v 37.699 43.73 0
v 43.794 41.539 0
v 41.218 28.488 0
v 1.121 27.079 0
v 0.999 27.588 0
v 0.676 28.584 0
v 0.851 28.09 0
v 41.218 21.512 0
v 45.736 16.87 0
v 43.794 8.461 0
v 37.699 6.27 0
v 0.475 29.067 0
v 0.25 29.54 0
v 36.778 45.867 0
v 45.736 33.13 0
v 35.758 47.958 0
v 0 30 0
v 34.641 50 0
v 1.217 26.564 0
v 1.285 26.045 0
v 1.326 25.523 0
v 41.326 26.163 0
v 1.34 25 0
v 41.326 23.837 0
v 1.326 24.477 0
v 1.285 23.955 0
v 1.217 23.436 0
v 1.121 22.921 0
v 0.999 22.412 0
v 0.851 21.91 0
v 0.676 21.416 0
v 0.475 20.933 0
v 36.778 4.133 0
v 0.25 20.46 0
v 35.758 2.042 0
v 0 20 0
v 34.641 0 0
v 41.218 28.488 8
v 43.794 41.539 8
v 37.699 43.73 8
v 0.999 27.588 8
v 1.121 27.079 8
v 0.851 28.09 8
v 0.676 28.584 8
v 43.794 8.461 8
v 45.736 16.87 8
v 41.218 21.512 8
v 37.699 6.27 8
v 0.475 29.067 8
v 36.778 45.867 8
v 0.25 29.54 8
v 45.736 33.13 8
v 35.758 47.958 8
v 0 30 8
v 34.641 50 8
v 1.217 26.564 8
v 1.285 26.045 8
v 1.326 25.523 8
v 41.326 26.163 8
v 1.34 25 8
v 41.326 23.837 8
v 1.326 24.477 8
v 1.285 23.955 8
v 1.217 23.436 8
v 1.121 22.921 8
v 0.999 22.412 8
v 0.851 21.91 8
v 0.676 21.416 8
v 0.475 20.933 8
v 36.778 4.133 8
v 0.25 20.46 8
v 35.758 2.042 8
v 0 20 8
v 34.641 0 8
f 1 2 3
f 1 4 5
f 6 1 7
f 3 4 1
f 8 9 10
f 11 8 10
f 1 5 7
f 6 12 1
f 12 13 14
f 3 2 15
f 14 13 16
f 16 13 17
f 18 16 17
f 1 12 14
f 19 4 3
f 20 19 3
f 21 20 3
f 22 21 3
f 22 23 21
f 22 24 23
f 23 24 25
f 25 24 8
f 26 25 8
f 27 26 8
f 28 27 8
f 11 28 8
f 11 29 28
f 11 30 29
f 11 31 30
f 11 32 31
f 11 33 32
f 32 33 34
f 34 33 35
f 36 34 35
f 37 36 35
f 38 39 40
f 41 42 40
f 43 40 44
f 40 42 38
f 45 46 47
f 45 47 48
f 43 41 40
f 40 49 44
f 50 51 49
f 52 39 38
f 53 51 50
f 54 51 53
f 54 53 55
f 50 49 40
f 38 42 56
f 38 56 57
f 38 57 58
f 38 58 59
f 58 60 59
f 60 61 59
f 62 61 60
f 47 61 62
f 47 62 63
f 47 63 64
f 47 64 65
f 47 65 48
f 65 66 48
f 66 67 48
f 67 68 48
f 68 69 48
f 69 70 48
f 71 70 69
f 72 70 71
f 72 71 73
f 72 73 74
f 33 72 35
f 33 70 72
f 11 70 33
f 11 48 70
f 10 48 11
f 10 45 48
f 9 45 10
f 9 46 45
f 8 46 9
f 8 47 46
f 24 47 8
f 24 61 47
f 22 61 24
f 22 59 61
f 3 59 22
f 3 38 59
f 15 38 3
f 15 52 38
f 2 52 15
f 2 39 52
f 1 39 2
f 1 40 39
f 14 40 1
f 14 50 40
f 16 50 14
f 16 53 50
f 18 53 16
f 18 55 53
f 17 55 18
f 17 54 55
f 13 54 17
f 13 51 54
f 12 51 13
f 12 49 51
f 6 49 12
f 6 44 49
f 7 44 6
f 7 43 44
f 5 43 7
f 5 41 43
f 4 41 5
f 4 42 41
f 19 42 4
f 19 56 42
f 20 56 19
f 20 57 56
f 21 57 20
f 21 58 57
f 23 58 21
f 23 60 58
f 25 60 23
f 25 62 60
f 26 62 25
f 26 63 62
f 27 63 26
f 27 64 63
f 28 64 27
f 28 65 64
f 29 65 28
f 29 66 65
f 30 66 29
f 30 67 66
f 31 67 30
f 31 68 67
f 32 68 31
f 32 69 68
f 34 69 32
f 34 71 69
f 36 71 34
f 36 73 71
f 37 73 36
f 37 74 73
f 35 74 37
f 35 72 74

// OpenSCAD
$fn = 32;

// ----------------------------------------------------------------------
// Gear sector: 2 teeth on 60 degrees
// ----------------------------------------------------------------------

// --- parameters (mm) ---
sector_angle = 60;        // sector angle, degrees
root_r = 50;              // root circle radius
tooth_h = 5;              // tooth height over the root circle
teeth = 2;                // number of teeth on the sector
hub_r = 10;               // hub bore radius
plate_t = 8;              // sector thickness, Z
arc_step = 3;             // sampling step of the root/hub arcs, degrees
fit_tol = 0.05;           // declared fit tolerance (prompt contract)
free_tol = 0.2;           // declared free tolerance (prompt contract)

tip_r = root_r + tooth_h;  // tip circle radius

profile = [[34.641, 0], [35.758, 2.042], [36.778, 4.133], [37.699, 6.27], [43.794, 8.461], [45.736, 16.87], [41.218, 21.512], [41.326, 23.837], [41.326, 26.163], [41.218, 28.488], [45.736, 33.13], [43.794, 41.539], [37.699, 43.73], [36.778, 45.867], [35.758, 47.958], [34.641, 50], [0, 30], [0.25, 29.54], [0.475, 29.067], [0.676, 28.584], [0.851, 28.09], [0.999, 27.588], [1.121, 27.079], [1.217, 26.564], [1.285, 26.045], [1.326, 25.523], [1.34, 25], [1.326, 24.477], [1.285, 23.955], [1.217, 23.436], [1.121, 22.921], [0.999, 22.412], [0.851, 21.91], [0.676, 21.416], [0.475, 20.933], [0.25, 20.46], [0, 20]];  // primary outline, 37 points, counter clockwise

// --- the one profile operation ---
linear_extrude(height = plate_t) polygon(points = profile);
